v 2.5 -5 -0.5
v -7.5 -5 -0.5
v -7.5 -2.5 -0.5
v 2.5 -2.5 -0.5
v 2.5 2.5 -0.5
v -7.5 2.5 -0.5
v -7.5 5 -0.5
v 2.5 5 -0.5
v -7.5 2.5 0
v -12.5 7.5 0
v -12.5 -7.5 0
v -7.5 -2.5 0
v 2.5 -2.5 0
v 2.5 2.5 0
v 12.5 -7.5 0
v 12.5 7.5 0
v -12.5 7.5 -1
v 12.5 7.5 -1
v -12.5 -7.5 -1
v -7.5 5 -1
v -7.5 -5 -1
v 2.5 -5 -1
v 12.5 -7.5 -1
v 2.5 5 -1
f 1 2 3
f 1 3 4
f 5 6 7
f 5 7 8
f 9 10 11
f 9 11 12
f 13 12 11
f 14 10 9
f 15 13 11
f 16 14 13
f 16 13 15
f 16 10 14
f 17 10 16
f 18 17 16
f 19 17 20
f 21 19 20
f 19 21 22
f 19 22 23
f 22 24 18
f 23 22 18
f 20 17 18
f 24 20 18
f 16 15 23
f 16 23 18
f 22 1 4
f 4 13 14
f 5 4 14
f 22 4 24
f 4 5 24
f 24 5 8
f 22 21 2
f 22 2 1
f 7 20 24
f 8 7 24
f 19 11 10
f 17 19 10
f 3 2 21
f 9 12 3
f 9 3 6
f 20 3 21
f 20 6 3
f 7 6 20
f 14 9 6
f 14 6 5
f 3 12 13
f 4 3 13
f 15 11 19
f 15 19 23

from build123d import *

# Parameters (mm, degrees)
F0_W     = 25
F0_H     = 14.999996
F1_DEPTH = 1.000001
F2_W     = 9.99998
F2_H     = 4.99999
F3_DEPTH = 25.4
F4_W     = 9.99998
F4_H     = 9.99998
F5_DEPTH = 0.499999


with BuildPart() as f1:
    # F0 (on Top) → F1 (new body)
    with BuildSketch(Plane.XY):
        Rectangle(F0_W, F0_H)
    extrude(amount=-F1_DEPTH)

    # F2 (on face) → F3 (cut)
    with BuildSketch(Plane.XY):
        with Locations((-2.499995, 0)):
            Rectangle(F2_W, F2_H)
    extrude(amount=-F3_DEPTH, mode=Mode.SUBTRACT)

    # F4 (on face) → F5 (cut)
    with BuildSketch(Plane(origin=(0, 0, -1.000001), x_dir=(1, 0, 0), z_dir=(0, 0, -1))):
        with Locations((-2.499995, 0)):
            Rectangle(F4_W, F4_H)
    extrude(amount=-F5_DEPTH, mode=Mode.SUBTRACT)


solid = f1.part
